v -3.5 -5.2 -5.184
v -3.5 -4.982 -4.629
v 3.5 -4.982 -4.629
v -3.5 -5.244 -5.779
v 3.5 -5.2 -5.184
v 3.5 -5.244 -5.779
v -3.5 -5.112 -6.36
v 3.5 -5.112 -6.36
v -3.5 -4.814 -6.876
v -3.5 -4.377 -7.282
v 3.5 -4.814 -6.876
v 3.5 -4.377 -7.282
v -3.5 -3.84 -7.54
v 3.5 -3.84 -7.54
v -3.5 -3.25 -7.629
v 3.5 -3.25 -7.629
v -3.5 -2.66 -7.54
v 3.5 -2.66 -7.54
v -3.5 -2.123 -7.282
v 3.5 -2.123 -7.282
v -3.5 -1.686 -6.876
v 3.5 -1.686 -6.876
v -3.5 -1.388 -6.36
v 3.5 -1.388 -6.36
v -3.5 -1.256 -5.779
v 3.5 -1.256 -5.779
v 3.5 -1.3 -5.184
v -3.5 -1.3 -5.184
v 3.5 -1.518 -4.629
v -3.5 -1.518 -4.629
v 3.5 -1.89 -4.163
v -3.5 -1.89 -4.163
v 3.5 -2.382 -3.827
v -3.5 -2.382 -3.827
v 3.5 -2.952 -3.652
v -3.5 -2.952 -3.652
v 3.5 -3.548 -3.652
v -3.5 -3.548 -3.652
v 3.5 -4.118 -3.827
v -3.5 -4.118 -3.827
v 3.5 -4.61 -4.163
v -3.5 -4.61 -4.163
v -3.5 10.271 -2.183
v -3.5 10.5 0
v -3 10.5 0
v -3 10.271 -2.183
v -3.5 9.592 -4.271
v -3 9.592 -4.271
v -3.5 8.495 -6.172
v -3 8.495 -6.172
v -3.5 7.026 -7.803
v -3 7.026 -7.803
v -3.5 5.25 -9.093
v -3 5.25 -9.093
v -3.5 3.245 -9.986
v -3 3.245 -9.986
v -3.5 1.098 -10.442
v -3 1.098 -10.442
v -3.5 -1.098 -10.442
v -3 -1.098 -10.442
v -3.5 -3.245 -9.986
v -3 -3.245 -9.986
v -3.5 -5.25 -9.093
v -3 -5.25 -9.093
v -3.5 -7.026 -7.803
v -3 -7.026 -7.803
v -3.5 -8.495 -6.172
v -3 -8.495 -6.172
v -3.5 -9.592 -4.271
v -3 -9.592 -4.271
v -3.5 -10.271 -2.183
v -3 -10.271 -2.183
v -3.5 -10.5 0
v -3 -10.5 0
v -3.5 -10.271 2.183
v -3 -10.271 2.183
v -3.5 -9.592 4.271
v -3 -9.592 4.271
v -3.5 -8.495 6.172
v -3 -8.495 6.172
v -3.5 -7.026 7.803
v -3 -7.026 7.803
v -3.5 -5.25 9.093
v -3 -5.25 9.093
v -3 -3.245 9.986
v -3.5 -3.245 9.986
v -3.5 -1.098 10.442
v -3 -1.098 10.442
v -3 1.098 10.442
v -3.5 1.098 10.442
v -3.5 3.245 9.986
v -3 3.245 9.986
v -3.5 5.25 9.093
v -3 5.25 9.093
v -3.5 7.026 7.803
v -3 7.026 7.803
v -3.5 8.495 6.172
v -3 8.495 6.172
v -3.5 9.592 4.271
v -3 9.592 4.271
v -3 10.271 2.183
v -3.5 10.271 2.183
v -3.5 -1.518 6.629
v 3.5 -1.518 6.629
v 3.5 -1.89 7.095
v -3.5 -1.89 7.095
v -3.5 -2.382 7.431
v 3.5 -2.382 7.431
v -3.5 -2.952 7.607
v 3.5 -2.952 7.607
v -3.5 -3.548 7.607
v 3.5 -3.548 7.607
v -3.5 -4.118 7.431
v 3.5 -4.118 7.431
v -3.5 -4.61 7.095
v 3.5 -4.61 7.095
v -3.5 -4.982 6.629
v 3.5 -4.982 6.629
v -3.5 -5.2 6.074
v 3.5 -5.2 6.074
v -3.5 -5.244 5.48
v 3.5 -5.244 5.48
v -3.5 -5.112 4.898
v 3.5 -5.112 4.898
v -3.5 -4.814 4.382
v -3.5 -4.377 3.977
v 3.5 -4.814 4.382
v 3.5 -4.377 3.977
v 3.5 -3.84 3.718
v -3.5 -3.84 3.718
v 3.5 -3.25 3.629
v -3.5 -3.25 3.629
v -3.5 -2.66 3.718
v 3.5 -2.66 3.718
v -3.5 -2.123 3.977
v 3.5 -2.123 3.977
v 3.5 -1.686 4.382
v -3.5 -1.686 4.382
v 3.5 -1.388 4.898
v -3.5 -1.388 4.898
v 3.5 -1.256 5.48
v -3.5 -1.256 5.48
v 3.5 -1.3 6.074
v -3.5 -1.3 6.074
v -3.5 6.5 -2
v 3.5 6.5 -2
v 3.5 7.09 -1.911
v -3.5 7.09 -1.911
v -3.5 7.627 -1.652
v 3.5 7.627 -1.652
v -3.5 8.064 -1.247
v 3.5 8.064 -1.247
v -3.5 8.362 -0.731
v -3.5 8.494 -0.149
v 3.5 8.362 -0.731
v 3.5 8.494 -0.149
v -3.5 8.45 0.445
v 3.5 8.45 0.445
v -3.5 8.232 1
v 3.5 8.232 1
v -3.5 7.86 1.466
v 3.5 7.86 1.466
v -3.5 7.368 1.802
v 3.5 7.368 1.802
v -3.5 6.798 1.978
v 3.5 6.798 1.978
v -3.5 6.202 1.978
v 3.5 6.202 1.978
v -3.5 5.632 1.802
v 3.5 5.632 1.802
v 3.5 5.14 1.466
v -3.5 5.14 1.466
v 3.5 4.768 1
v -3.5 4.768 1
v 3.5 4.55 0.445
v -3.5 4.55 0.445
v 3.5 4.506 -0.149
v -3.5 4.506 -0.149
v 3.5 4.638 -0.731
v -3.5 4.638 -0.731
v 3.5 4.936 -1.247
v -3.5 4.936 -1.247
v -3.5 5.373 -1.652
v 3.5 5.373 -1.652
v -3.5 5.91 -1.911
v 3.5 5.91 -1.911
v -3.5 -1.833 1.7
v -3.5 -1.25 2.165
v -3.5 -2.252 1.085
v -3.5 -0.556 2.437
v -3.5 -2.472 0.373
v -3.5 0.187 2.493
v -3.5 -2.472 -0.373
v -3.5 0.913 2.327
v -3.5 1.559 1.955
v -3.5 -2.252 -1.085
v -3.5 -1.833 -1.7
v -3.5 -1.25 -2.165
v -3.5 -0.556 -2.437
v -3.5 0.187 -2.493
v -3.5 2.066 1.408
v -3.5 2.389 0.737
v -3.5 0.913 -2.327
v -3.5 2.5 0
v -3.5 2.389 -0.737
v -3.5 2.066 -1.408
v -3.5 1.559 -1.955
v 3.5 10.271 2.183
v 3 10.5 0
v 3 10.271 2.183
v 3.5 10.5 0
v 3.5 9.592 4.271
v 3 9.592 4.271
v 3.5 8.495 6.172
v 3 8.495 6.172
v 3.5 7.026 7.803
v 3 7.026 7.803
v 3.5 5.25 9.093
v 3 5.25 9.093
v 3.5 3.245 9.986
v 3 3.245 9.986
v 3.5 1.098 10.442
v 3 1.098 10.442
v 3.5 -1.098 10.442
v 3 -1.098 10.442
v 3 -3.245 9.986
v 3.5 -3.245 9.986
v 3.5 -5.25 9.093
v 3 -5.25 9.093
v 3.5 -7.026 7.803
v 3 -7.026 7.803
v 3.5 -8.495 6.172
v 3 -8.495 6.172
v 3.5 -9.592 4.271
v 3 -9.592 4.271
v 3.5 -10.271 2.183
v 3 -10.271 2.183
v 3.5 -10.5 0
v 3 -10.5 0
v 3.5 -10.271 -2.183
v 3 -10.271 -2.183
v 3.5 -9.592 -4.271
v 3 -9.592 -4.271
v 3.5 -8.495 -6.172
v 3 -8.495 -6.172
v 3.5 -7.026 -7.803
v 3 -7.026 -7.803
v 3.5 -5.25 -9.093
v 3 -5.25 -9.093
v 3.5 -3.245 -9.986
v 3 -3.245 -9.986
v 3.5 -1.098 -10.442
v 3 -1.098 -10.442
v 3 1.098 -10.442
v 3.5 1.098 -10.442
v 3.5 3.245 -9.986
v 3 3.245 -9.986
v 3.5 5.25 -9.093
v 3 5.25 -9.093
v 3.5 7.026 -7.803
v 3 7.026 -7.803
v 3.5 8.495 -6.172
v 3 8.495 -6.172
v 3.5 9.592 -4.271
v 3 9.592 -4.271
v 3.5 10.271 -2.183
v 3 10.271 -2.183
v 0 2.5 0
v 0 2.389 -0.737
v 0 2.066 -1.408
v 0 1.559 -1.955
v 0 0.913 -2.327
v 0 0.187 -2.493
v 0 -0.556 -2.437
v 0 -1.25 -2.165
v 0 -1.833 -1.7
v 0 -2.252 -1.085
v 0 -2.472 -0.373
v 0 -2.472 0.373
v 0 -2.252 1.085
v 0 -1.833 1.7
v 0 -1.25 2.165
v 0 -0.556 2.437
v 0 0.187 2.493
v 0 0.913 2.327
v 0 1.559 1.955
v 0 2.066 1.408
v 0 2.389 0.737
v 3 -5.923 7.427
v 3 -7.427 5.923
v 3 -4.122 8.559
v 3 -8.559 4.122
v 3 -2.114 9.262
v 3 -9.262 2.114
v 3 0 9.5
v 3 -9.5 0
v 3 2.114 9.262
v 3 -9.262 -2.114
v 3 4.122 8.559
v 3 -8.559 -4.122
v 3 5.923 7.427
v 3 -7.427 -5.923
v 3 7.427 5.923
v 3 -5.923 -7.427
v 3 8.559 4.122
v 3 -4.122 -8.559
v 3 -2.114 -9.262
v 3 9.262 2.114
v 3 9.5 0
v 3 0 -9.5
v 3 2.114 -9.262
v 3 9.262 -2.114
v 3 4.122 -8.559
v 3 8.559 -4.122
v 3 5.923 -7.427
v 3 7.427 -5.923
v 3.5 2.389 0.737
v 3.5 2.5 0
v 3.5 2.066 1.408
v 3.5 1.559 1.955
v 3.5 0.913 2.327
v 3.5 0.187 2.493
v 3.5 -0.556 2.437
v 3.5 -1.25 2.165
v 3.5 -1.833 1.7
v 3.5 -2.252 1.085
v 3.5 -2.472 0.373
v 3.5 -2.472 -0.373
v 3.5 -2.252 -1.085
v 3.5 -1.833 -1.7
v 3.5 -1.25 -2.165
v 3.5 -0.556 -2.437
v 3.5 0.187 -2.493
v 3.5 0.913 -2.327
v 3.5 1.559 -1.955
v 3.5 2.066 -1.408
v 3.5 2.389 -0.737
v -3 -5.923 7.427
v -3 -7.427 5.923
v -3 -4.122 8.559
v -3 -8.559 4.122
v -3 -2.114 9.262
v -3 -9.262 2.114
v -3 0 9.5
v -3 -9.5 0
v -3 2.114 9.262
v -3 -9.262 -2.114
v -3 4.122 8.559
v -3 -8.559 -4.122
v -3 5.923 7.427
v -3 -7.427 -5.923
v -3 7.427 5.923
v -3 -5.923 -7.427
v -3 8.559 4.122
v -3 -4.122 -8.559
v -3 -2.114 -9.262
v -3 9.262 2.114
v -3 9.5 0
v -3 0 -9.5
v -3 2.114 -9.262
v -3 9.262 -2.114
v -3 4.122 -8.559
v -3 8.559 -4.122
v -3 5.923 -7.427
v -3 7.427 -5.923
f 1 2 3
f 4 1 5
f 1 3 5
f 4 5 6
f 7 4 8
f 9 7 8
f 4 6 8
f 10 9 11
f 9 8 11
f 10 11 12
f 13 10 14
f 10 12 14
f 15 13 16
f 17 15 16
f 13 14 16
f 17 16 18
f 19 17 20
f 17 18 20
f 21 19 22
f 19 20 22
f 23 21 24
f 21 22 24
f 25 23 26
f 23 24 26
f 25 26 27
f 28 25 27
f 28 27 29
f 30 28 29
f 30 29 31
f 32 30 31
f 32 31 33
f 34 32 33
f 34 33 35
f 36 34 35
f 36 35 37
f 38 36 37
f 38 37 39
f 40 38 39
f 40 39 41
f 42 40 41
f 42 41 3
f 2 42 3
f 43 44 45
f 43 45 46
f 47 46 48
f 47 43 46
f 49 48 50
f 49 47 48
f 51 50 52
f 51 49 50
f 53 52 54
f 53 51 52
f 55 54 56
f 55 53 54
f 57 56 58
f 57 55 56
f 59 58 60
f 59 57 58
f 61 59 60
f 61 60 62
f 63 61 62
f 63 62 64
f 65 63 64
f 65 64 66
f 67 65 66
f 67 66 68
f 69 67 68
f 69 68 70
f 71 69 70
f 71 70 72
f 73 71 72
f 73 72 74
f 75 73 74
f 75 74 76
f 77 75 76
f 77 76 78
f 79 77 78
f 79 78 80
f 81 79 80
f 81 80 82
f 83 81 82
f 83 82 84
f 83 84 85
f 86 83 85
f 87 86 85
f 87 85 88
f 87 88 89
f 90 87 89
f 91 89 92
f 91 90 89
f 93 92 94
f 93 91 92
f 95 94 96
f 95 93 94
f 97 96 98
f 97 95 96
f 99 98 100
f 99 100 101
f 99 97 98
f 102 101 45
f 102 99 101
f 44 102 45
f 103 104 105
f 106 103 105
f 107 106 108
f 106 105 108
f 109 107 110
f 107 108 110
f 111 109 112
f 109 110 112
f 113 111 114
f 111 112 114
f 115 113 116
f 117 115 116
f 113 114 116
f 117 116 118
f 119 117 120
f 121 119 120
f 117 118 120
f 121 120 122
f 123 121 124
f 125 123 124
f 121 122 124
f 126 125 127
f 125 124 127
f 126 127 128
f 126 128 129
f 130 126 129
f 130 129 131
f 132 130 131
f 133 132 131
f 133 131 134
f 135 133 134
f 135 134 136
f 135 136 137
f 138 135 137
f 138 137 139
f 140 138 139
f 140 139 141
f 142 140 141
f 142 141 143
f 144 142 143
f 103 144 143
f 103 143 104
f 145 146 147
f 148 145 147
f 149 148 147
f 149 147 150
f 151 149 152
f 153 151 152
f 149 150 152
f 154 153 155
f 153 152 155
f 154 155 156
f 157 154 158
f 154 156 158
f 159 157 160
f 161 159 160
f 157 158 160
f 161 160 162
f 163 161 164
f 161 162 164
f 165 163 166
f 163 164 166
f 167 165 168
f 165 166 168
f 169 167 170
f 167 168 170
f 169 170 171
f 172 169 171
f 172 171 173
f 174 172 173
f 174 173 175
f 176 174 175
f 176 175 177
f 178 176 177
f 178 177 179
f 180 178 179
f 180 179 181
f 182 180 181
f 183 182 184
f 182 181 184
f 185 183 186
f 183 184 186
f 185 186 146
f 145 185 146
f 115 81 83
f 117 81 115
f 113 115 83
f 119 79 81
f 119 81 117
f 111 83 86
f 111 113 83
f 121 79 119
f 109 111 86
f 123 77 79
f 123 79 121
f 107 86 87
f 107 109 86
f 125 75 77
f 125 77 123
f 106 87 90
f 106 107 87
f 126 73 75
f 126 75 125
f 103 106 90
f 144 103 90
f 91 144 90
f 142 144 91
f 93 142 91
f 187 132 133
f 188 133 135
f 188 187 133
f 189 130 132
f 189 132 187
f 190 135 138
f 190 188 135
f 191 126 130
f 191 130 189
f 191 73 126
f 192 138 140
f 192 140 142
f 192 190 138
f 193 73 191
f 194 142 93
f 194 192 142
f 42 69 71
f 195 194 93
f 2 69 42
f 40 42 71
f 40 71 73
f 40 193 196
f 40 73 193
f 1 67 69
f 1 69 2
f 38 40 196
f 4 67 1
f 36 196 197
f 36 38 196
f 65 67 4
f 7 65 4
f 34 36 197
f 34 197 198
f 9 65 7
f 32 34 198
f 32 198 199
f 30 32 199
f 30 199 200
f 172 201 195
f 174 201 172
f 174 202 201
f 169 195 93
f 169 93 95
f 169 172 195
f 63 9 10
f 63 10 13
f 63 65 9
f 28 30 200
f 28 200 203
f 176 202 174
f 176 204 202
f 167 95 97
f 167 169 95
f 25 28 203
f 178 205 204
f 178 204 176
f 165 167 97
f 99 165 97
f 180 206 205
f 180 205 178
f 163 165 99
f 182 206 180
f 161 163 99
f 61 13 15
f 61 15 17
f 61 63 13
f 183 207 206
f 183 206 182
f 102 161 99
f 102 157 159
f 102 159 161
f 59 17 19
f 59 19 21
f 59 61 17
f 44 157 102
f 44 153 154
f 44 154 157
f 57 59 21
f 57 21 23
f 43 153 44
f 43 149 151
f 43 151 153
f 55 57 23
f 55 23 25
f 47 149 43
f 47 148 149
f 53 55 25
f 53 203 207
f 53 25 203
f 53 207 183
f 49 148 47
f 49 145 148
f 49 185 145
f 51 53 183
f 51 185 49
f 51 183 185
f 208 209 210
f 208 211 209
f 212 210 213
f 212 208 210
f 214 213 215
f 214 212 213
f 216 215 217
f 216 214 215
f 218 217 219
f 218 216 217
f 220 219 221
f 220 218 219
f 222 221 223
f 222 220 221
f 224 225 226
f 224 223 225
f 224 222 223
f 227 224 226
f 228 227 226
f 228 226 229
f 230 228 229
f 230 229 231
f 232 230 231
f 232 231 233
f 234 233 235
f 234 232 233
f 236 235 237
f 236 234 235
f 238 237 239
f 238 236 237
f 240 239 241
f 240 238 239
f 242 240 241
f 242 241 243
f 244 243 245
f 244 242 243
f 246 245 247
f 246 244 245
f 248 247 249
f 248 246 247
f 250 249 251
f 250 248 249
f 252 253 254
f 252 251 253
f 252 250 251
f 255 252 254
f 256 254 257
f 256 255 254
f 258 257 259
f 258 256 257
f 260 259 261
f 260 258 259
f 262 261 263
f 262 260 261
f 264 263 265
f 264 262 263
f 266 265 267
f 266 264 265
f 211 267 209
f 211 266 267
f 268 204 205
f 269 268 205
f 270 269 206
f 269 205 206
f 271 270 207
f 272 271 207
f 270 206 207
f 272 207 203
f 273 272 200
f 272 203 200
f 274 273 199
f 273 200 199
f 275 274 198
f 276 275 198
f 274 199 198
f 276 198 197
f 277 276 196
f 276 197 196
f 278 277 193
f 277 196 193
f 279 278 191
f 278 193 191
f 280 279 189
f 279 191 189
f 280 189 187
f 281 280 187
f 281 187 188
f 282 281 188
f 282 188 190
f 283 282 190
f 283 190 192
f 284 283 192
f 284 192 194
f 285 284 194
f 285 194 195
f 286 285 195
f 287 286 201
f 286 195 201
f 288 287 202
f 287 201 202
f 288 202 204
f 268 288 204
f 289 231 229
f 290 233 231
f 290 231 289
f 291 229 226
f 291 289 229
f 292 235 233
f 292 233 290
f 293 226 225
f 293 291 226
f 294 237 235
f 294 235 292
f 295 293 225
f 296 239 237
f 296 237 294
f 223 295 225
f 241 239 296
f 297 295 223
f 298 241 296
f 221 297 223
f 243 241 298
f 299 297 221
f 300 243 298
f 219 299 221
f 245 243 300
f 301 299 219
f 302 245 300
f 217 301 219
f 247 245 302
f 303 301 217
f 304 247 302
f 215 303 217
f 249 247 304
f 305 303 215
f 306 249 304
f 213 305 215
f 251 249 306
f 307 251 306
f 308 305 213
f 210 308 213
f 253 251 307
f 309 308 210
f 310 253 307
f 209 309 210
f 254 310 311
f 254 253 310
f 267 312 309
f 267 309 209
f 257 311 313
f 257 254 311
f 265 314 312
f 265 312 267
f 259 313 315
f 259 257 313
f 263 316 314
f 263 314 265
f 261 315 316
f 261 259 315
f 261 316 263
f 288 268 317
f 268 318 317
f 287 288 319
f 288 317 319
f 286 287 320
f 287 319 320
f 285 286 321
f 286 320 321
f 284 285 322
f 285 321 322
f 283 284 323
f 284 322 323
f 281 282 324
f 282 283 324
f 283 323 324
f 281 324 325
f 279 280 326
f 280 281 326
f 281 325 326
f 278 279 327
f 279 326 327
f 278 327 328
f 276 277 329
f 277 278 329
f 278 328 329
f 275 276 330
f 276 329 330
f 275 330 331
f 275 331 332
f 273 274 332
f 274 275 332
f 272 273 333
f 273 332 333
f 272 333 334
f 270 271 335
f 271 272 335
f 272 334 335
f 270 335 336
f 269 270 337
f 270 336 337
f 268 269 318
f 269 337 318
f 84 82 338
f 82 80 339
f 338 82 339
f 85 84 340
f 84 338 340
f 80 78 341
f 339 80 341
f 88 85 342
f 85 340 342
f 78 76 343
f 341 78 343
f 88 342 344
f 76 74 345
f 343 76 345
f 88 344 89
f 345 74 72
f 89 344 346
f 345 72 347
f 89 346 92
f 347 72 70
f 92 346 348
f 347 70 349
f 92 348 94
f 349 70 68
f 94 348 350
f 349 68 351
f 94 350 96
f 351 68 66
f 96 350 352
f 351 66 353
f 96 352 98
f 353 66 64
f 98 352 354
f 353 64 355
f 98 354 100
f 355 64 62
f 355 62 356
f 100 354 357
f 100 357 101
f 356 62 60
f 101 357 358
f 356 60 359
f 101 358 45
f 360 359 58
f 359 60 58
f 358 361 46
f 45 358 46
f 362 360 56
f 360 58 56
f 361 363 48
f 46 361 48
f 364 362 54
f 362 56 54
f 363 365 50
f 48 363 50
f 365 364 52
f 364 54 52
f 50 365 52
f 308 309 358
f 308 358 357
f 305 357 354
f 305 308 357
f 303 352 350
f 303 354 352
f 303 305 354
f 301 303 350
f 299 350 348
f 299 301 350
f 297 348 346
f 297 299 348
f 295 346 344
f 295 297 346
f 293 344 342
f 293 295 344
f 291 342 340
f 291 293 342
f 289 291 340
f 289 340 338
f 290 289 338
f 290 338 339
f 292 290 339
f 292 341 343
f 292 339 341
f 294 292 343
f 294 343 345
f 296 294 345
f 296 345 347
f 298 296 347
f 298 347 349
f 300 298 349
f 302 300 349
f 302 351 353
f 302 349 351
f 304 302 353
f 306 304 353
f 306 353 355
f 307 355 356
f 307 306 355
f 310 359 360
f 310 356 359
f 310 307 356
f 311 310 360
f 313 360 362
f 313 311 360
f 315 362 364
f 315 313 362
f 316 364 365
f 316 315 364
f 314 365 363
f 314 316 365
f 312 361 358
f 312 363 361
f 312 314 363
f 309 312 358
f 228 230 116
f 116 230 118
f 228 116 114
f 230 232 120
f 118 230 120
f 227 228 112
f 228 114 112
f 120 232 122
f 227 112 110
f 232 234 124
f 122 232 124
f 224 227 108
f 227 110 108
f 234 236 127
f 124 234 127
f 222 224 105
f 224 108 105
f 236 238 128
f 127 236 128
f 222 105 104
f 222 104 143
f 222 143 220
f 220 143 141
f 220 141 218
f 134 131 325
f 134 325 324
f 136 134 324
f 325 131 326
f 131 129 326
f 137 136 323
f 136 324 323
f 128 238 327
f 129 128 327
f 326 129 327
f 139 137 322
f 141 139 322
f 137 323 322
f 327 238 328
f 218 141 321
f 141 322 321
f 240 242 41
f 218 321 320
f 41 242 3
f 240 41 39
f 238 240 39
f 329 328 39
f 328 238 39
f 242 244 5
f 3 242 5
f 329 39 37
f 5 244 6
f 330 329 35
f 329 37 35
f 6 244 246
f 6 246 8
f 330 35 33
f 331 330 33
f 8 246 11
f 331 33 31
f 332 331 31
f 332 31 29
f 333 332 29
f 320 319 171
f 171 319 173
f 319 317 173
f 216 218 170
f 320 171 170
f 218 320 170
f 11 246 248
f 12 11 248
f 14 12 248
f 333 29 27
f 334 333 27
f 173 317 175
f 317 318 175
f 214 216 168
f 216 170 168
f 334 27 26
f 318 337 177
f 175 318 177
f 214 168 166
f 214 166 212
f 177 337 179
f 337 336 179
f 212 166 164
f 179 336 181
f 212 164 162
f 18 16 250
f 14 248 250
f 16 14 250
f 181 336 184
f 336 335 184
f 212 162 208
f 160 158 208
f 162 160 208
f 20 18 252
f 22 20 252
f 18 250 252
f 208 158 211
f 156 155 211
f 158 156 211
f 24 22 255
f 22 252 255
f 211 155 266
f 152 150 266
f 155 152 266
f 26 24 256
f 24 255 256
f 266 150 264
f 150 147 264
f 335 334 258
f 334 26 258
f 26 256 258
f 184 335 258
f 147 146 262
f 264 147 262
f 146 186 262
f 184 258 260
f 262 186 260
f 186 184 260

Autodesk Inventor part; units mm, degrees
ref_plane "YZ Plane" through (0, 0, 0) normal (1, 0, 0) x (0, 1, 0)
ref_plane "XZ Plane" through (0, 0, 0) normal (0, 1, 0) x (-1, 0, 0)
ref_plane "XY Plane" through (0, 0, 0) normal (0, 0, 1) x (1, 0, 0)
sketch "Sketch1" plane through (0, 0, 0) normal (0, 0, 1) x (1, 0, 0)
  line L0 (0, 0) -> (0, 9.5) construction
  line L1 (0, 9.5) -> (3, 9.5)
  line L2 (3, 9.5) -> (3, 10.5)
  line L3 (3, 10.5) -> (3.5, 10.5)
  line L4 (3.5, 10.5) -> (3.5, 0) construction
  line L5 (3.5, 0) -> (0, 0) construction
  line L6 (0, 2.5) -> (3.5, 2.5)
  line L7 (3.5, 2.5) -> (3.5, 10.5)
  line L8 (0, 9.5) -> (-3, 9.5)
  line L9 (-3, 9.5) -> (-3, 10.5)
  line L10 (-3, 10.5) -> (-3.5, 10.5)
  line L11 (-3.5, 10.5) -> (-3.5, 0) construction
  line L12 (0, 2.5) -> (-3.5, 2.5)
  line L13 (-3.5, 2.5) -> (-3.5, 10.5)
  dimension "d0" = 2.5
  dimension "d1" = 3
  dimension "d2" = 0.5
  dimension "d8" = 1
  dimension "d10" = 10.5
revolve "Revolution2" add sketch "Sketch1" angle 360 about axis through (3.5, 0, 0) along (-1, 0, 0)
sketch "Sketch2" plane through (3.5, 0, 0) normal (1, 0, 0) x (0, 0, -1)
  circle A0 centre (0, 0) radius 2.5 projected
  circle A1 centre (0, 6.5) radius 2
  dimension "d11" = 6.5
  dimension "d12" = 4
extrude "Extrusion1" cut sketch "Sketch2" against normal through all contours A1
pattern_circular "Circular Pattern1" count 3 over 360 about axis through (1.5, 0, 0) along (1, 0, 0) of "Extrusion1"
properties part number "FoilCoil"
